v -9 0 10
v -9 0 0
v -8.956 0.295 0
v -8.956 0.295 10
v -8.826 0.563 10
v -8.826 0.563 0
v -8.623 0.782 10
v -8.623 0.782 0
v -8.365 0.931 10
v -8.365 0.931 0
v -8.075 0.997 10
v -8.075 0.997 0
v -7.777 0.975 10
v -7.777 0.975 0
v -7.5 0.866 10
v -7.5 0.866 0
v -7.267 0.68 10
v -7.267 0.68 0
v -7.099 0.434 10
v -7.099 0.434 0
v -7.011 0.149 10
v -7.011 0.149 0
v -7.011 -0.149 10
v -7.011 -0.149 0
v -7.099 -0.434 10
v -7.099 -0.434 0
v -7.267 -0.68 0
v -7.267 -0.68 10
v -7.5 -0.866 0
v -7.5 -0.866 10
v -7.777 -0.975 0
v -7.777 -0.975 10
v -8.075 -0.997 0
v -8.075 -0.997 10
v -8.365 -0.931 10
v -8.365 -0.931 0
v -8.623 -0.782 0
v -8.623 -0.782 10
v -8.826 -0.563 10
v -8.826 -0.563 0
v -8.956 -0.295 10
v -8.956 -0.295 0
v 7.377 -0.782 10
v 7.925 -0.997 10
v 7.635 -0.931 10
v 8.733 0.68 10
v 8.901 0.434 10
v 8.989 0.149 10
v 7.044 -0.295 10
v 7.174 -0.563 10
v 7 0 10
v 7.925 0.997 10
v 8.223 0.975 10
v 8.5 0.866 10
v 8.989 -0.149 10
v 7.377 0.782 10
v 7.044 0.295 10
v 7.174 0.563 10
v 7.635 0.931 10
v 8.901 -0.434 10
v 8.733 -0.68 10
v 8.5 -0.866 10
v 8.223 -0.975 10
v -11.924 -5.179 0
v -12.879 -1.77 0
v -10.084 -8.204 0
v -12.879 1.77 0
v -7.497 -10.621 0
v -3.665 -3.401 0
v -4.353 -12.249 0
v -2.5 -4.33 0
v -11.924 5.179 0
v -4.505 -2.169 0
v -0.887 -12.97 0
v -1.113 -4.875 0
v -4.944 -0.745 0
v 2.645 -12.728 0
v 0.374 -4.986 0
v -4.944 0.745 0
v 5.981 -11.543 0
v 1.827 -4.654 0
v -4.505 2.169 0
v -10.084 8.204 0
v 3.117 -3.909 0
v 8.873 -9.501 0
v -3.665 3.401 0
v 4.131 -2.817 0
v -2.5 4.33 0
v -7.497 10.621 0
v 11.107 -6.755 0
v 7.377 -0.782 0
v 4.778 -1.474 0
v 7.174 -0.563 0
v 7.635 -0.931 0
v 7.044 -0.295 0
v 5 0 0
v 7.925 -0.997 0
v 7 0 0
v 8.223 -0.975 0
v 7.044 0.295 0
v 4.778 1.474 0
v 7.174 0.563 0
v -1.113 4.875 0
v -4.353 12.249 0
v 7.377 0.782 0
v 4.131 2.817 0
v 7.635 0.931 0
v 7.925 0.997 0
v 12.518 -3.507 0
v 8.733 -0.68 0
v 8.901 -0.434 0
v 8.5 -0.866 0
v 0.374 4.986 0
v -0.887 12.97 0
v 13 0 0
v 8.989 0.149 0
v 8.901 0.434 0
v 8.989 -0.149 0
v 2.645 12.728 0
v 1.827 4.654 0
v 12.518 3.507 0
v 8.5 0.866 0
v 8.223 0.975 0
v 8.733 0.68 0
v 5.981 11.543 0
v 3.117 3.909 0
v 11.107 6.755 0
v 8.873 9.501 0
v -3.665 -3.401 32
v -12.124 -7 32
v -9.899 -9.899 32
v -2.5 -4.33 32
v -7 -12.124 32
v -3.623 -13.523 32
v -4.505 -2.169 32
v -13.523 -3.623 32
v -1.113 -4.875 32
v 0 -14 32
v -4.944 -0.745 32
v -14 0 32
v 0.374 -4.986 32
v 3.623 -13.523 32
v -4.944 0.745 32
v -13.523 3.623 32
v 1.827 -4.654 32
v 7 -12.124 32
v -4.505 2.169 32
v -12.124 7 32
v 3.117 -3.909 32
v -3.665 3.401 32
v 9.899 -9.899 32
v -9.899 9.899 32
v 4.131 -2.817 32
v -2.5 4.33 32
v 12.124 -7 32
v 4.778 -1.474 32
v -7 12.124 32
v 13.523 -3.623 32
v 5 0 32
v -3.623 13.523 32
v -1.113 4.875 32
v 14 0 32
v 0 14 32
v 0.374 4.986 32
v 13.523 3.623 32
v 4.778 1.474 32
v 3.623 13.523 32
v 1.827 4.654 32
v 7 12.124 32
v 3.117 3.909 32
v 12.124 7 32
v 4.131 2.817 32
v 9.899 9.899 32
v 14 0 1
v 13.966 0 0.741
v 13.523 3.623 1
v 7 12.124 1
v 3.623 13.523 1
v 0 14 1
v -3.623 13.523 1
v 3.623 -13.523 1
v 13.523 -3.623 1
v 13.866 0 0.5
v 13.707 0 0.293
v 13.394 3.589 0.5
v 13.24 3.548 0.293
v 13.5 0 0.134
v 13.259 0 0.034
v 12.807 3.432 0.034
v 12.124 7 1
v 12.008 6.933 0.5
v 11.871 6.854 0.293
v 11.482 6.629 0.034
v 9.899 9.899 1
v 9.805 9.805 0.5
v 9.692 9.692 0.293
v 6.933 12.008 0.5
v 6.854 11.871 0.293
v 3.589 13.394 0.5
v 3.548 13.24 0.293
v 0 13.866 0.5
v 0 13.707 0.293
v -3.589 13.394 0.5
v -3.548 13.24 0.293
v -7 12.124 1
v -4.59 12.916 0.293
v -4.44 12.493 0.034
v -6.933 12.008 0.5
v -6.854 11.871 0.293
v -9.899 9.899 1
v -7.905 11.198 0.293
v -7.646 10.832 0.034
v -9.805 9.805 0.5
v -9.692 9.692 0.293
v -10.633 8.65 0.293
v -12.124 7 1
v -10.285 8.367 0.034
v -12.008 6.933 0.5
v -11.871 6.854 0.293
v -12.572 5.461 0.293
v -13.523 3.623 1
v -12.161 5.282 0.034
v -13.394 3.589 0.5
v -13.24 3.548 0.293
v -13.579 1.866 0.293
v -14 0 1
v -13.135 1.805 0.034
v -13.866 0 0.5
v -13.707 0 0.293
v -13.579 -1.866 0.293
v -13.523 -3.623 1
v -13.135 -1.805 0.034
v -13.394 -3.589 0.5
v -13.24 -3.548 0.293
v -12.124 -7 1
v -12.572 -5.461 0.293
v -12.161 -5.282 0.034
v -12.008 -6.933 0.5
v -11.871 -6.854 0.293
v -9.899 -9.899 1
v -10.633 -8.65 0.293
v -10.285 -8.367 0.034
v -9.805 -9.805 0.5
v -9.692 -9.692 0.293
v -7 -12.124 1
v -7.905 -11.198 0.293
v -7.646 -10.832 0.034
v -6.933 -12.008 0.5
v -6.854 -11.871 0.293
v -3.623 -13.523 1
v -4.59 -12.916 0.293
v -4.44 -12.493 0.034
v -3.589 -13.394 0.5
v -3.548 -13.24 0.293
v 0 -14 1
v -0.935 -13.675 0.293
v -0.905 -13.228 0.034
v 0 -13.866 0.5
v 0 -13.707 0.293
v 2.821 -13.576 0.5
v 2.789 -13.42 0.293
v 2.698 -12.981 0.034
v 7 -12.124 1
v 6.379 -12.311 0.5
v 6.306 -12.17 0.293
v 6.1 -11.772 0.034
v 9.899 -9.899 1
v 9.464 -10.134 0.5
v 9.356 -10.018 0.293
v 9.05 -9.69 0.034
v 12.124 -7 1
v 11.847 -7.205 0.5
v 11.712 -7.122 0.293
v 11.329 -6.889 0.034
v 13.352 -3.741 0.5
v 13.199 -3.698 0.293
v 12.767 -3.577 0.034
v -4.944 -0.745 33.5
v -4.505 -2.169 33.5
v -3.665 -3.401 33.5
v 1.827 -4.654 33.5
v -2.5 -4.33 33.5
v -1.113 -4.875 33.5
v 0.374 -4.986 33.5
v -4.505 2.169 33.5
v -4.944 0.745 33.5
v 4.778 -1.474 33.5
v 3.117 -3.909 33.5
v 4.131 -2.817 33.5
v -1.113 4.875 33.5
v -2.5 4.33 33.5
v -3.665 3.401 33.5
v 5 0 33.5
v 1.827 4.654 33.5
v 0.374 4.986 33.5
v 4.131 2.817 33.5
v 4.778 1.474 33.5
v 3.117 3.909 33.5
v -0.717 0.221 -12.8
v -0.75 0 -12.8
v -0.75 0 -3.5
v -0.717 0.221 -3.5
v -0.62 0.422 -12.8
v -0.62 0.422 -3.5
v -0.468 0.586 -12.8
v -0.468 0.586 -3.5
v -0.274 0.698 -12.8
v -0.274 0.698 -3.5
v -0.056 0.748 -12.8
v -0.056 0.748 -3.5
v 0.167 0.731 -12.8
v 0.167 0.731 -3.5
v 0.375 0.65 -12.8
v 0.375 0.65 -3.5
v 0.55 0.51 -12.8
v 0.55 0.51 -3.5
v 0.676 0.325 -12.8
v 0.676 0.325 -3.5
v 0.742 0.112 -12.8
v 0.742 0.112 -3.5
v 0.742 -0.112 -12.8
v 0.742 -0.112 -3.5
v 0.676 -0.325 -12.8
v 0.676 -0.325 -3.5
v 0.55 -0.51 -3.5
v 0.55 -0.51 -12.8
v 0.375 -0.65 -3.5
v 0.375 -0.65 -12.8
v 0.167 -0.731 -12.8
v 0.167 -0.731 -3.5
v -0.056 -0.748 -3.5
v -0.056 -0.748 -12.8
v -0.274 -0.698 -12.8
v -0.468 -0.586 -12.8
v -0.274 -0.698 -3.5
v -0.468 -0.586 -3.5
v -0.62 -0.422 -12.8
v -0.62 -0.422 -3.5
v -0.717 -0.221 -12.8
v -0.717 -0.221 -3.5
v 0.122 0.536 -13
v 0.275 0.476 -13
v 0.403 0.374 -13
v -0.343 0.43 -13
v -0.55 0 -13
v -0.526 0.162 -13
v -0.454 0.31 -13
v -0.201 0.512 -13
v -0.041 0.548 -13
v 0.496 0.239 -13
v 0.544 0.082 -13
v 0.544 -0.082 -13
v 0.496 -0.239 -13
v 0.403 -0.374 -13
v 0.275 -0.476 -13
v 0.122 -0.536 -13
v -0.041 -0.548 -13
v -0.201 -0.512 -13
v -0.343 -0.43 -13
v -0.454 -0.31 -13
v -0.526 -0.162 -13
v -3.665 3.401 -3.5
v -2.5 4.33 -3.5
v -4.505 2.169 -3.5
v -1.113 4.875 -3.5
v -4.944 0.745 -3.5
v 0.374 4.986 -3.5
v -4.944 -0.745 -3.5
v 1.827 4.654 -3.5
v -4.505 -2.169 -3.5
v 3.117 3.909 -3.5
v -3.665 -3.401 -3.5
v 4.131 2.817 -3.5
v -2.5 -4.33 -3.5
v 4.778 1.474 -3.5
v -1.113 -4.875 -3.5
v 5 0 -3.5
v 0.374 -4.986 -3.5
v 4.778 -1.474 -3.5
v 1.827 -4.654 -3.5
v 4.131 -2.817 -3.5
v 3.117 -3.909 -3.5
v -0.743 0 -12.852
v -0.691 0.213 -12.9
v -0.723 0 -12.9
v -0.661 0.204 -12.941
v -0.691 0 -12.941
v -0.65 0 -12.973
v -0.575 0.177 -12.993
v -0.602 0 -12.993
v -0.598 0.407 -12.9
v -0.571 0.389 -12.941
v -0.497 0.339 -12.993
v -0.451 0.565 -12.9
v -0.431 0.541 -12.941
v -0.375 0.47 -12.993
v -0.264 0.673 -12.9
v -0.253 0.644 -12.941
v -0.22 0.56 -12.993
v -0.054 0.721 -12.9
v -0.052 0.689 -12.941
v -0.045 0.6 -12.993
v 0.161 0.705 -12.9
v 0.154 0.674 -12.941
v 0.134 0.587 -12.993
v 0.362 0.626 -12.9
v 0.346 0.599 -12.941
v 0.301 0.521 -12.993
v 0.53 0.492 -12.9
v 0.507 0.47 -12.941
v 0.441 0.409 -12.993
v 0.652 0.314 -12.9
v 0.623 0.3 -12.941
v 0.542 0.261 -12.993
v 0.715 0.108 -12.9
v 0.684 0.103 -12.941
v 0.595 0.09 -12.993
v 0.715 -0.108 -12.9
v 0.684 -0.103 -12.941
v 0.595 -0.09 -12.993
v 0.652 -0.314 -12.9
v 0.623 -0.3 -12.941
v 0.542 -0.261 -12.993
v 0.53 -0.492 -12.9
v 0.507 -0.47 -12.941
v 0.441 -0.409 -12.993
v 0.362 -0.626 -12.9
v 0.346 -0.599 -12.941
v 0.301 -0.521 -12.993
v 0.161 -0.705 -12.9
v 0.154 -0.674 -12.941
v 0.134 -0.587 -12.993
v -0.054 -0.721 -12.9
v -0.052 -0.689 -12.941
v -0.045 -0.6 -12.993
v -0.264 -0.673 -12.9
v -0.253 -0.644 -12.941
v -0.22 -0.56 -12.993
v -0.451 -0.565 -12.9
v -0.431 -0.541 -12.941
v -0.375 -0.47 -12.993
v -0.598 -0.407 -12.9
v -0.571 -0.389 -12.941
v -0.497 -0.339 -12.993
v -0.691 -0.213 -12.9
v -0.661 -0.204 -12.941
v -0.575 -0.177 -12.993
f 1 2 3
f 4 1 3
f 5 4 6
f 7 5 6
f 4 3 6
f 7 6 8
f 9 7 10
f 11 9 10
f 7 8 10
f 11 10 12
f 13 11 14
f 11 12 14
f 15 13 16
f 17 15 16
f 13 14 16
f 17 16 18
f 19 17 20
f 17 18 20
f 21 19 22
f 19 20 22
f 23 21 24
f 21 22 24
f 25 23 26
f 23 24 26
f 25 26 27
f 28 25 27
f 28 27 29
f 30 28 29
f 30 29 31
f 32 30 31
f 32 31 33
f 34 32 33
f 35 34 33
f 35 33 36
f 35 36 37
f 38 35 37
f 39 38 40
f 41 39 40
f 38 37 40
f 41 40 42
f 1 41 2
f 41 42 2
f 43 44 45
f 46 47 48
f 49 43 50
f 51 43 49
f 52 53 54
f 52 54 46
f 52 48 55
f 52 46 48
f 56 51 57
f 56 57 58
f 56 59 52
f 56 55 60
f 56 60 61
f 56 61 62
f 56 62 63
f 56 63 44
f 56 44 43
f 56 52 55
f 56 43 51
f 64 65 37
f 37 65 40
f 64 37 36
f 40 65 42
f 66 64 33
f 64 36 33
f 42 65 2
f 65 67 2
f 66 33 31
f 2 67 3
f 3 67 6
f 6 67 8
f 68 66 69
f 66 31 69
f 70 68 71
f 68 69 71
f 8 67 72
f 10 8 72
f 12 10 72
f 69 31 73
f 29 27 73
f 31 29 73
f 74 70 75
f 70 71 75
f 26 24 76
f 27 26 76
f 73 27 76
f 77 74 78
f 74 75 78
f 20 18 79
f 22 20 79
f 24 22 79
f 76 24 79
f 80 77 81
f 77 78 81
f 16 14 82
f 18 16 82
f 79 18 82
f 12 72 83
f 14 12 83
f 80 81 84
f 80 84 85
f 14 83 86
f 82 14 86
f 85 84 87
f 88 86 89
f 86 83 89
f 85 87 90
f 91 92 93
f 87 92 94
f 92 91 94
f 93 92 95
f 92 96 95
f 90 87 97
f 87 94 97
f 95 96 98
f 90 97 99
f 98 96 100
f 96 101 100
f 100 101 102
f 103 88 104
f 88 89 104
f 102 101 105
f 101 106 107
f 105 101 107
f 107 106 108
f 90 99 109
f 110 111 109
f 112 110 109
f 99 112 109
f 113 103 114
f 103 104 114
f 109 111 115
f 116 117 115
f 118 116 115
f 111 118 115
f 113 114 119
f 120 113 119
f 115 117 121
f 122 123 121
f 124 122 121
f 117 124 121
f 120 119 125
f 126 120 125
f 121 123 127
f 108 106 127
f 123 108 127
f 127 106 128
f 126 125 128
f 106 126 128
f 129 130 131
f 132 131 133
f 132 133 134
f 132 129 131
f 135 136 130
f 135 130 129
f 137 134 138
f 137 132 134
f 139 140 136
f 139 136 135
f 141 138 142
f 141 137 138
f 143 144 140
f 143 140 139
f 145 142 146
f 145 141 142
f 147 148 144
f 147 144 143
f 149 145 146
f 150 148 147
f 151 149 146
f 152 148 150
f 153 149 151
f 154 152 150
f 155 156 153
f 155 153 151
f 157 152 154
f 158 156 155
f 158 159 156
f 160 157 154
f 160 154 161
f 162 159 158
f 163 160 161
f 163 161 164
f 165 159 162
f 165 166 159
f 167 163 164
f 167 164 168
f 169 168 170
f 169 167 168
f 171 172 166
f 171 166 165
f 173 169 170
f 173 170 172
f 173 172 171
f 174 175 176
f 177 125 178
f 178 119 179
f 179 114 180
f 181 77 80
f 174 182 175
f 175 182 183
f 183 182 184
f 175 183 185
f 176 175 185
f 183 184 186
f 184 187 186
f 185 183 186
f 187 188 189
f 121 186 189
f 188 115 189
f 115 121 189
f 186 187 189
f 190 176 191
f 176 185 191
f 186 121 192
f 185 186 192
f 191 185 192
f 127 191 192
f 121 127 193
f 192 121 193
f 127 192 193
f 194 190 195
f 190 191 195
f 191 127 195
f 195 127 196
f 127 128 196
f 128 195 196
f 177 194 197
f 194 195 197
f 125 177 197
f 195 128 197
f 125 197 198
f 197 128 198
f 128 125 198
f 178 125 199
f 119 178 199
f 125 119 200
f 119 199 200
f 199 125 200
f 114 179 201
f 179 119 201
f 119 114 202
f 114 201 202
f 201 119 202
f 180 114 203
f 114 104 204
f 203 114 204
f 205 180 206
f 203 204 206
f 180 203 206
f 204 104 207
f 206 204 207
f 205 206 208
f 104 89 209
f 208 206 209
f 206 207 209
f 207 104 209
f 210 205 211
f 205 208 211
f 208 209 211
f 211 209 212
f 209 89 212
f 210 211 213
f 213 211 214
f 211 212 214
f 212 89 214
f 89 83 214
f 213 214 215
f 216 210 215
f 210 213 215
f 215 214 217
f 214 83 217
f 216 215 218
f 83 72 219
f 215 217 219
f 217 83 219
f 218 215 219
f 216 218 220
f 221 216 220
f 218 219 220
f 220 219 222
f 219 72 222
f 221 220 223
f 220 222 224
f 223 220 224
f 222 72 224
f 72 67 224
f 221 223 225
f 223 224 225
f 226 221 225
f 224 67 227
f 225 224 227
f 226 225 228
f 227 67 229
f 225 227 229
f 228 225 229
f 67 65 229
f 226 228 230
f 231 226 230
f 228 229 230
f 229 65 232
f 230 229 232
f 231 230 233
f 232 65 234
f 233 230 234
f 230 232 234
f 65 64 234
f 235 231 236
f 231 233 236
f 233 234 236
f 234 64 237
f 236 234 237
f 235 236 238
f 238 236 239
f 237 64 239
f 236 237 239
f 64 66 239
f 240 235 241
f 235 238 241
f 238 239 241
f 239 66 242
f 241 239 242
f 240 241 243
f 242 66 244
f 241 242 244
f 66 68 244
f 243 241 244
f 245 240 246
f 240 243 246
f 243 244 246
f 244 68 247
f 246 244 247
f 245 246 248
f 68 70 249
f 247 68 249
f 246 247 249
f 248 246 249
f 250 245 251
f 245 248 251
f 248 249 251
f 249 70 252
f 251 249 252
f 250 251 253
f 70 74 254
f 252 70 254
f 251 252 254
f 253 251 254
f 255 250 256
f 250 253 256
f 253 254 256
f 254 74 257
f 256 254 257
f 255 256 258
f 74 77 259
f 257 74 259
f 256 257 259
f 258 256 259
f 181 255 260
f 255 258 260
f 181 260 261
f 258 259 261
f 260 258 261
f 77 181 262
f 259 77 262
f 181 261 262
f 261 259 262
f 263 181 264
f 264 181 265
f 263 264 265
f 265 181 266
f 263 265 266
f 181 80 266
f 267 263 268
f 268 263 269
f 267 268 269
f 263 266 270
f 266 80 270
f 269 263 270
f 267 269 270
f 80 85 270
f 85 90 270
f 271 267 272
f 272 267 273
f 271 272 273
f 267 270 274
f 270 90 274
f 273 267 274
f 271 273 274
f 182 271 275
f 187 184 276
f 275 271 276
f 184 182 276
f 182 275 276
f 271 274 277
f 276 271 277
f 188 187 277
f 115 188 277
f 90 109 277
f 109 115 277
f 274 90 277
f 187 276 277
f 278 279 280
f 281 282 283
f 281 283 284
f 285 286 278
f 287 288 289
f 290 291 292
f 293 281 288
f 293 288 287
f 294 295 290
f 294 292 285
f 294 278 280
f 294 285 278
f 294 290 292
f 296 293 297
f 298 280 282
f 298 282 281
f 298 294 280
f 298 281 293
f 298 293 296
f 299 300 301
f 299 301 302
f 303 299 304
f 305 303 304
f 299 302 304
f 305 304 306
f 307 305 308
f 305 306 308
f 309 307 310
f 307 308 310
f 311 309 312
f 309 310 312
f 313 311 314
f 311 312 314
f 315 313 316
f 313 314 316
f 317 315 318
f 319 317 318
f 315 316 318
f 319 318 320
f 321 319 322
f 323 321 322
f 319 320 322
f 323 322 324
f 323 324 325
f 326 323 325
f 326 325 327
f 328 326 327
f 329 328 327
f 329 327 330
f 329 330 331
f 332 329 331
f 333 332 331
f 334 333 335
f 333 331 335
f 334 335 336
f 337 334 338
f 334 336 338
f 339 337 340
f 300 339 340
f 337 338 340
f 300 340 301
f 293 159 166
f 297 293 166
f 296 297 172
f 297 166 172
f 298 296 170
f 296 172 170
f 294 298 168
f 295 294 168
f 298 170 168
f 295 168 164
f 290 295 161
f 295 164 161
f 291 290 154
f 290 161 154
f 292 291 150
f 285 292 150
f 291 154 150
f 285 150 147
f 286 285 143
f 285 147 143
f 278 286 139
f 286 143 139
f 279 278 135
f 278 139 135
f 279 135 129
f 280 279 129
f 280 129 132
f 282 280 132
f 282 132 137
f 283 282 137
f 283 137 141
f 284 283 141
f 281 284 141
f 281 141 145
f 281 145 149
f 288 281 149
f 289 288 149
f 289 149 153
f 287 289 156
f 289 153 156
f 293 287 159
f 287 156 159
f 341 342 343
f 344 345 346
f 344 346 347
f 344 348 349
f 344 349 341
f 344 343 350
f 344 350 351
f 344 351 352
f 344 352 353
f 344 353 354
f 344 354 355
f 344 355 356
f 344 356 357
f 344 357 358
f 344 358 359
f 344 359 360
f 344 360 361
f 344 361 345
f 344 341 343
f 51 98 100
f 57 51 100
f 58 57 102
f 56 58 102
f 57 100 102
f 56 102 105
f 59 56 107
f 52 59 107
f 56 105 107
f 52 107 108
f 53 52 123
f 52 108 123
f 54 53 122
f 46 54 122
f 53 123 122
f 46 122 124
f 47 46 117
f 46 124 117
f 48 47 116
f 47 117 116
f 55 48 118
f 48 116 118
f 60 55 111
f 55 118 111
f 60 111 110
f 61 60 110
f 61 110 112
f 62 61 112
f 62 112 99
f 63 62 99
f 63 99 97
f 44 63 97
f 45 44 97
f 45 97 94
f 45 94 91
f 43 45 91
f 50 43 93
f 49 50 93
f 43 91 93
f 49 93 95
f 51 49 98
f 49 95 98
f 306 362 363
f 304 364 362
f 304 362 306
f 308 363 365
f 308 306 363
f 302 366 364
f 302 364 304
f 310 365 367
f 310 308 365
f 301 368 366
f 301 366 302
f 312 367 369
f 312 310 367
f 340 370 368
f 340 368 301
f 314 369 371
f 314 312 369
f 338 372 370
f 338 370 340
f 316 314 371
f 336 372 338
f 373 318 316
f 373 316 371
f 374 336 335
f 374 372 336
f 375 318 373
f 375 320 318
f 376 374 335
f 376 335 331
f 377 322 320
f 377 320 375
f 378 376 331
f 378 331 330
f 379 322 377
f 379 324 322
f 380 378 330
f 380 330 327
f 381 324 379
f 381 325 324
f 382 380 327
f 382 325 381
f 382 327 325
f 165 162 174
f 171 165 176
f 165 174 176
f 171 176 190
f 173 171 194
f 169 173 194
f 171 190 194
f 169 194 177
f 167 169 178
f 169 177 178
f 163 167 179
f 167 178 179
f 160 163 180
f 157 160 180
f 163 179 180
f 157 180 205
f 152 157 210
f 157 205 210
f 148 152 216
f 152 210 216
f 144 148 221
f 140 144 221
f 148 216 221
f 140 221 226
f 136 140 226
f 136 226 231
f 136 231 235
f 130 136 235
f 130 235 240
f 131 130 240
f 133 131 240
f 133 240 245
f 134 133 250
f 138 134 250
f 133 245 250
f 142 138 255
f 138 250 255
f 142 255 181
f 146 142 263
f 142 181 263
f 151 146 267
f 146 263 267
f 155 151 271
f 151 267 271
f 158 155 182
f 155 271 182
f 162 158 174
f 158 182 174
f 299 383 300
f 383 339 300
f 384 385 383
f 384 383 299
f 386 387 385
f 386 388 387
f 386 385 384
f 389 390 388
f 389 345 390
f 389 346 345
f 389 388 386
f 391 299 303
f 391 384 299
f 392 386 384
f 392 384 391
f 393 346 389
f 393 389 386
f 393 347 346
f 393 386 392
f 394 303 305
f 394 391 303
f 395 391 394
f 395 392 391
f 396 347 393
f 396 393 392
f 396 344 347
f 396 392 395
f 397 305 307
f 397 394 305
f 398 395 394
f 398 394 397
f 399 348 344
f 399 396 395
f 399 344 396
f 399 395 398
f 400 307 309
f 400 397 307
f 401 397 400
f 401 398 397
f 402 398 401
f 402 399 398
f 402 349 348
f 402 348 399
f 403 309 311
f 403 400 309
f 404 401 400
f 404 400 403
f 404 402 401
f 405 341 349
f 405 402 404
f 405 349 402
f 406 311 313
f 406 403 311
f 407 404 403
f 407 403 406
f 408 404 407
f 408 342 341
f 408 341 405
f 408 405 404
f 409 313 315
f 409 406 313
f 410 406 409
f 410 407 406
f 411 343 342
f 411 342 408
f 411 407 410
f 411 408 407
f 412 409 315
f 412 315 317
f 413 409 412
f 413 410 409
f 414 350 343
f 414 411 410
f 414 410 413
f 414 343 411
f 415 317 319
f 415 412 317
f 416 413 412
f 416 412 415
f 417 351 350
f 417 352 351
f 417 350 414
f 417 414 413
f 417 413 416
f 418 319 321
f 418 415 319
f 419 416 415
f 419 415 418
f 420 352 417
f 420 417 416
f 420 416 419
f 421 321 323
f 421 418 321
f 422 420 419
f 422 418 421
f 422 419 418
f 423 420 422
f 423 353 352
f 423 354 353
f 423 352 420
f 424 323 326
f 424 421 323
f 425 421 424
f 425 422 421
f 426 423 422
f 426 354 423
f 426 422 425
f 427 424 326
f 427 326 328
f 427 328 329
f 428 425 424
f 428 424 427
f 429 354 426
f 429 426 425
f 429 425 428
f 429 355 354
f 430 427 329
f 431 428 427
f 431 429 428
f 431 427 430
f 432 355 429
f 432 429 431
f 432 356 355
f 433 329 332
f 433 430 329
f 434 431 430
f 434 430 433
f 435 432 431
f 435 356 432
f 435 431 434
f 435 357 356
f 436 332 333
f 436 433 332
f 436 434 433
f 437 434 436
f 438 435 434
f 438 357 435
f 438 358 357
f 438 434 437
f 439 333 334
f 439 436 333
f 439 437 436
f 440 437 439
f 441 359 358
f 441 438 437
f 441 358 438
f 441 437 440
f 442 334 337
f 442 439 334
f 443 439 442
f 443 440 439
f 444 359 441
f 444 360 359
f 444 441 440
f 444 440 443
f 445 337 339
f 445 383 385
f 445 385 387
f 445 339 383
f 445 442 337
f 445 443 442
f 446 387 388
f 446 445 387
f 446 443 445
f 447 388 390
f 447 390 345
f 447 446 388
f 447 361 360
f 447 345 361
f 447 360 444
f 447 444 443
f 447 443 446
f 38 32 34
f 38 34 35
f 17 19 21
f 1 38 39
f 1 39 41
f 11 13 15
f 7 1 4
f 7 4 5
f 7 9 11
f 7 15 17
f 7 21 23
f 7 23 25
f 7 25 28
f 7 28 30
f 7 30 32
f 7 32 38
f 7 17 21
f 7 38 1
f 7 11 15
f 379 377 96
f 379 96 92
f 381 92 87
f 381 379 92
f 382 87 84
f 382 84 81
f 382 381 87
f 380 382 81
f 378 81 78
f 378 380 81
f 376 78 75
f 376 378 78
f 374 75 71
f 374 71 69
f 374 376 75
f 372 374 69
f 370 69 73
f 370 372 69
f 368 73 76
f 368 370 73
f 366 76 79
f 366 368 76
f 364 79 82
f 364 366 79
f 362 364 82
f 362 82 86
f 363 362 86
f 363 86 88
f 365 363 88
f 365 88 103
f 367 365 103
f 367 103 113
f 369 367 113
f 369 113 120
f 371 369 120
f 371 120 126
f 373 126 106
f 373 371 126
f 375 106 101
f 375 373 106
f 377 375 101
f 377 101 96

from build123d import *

# Parameters (mm, degrees)
SKETCH1_R           = 14
BOSS_EXTRUDE1_DEPTH = 32
SKETCH2_R           = 5
BOSS_EXTRUDE2_DEPTH = 1.5
BOSS_EXTRUDE3_START = 3.5
SKETCH3_R           = 5
BOSS_EXTRUDE3_DEPTH = 3.5
SKETCH4_R           = 0.75
BOSS_EXTRUDE4_DEPTH = 9.5
SKETCH5_R           = 1
CUT_EXTRUDE1_DEPTH  = 10
FILLET1_R           = 1
FILLET2_R           = 0.2


with BuildPart() as part:
    # Sketch1 → Boss-Extrude1 (new body)
    with BuildSketch(Plane.XY):
        Circle(SKETCH1_R)
    extrude(amount=BOSS_EXTRUDE1_DEPTH)

    # Sketch2 → Boss-Extrude2 (add)
    with BuildSketch(Plane.XY.offset(32)):
        Circle(SKETCH2_R)
    extrude(amount=BOSS_EXTRUDE2_DEPTH)

    # Sketch3 → Boss-Extrude3 (add)
    with BuildSketch(Plane(origin=(0, 0, 0), x_dir=(-1, 0, 0), z_dir=(0, 0, -1)).offset(BOSS_EXTRUDE3_START)):
        with Locations(Location((0, 0, 0), (0, 0, 180))):
            Circle(SKETCH3_R)
    extrude(amount=-BOSS_EXTRUDE3_DEPTH)

    # Sketch4 → Boss-Extrude4 (add)
    with BuildSketch(Plane(origin=(0, 0, -3.5), x_dir=(-1, 0, 0), z_dir=(0, 0, -1))):
        Circle(SKETCH4_R)
    extrude(amount=BOSS_EXTRUDE4_DEPTH)

    # Sketch5 → Cut-Extrude1 (cut)
    with BuildSketch(Plane(origin=(0, 0, 0), x_dir=(-1, 0, 0), z_dir=(0, 0, -1))):
        with Locations((8, 0)):
            Circle(SKETCH5_R)
        with Locations((-8, 0)):
            Circle(SKETCH5_R)
    extrude(amount=-CUT_EXTRUDE1_DEPTH, mode=Mode.SUBTRACT)

    # Fillet1
    fillet1_edges = [part.edges().sort_by_distance(p)[0] for p in [
        (-14, 0, 0),
    ]]
    fillet(fillet1_edges, radius=FILLET1_R)

    # Fillet2
    fillet2_edges = [part.edges().sort_by_distance(p)[0] for p in [
        (0.75, 0, -13),
    ]]
    fillet(fillet2_edges, radius=FILLET2_R)


solid = part.part
